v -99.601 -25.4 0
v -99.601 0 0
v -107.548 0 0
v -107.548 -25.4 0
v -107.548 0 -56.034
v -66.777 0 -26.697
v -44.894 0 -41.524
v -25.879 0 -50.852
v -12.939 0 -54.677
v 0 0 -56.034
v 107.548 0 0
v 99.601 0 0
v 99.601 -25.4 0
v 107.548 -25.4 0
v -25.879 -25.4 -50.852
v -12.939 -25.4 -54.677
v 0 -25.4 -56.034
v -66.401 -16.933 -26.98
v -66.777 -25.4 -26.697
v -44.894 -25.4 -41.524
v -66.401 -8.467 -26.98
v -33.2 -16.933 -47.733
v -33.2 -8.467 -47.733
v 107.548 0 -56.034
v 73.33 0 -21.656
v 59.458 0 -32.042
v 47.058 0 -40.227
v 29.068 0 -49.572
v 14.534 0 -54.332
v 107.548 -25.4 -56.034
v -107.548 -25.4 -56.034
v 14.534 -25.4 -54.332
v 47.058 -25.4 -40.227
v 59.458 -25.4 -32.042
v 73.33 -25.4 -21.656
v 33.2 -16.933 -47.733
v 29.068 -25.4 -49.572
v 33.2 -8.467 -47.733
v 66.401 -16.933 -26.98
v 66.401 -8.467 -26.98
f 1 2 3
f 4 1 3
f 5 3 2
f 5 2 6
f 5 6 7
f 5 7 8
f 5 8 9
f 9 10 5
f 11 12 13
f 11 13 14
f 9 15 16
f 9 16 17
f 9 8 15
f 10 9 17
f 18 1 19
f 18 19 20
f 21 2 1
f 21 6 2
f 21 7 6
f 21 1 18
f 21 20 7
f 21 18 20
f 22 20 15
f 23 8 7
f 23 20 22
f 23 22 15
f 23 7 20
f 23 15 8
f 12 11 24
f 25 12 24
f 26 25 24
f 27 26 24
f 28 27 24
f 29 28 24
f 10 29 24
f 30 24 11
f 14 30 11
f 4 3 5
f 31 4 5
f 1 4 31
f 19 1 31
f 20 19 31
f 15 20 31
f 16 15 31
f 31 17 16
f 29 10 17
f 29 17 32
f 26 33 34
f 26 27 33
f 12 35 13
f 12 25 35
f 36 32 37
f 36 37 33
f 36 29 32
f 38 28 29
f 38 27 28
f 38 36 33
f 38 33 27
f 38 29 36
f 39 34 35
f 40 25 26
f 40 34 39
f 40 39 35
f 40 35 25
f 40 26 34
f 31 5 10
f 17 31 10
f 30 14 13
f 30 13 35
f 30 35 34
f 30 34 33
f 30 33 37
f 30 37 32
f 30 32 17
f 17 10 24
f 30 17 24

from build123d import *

# Parameters (mm, degrees)
F1_DEPTH = 25.4
F0_W     = 7.9461932182
F0_H     = 56.0344010592


with BuildPart() as f1:
    # F0 (on Front) → F1 (new body)
    with BuildSketch(Plane.XZ):
        Polygon((-99.6014922857, -2.6030649897), (-99.6014922857, 0), (-107.547685504, 0), (-107.547685504, -56.0344010592), (-99.6014922857, -56.0344010592), align=None)
        with BuildLine():
            add(Edge.make_bspline(
                [(-99.6014922857, 0), (-66.4009948572, -28.0172005296), (-33.2004974052, -56.0344010789), (4.68e-08, -56.0344010592)],
                knots=[0, 0, 0, 0, 0.5, 0.5, 0.5, 0.5], degree=3))
            Line((-99.6014922857, 0), (-99.6014922857, -2.6030649897))
            Line((-99.6014922857, -2.6030649897), (-99.6014922857, -56.0344010592))
            Line((-99.6014922857, -56.0344010592), (7.02e-08, -56.0344010592))
        make_face()
    extrude(amount=F1_DEPTH)


with BuildPart() as f1b:
    # F0 (on Front) → F1, piece 2 (new body)
    with BuildSketch(Plane.XZ):
        with BuildLine():
            add(Edge.make_bspline(
                [(4.68e-08, -56.0344010592), (33.200497452, -56.0344010394), (66.4009948572, -28.0172005296), (99.6014922857, 0)],
                knots=[0.5, 0.5, 0.5, 0.5, 1, 1, 1, 1], degree=3))
            Line((7.02e-08, -56.0344010592), (99.6014922857, -56.0344010592))
            Line((99.6014922857, -56.0344010592), (99.6014922857, 0))
        make_face()
        with Locations((103.5745888948, -28.0172005296)):
            Rectangle(F0_W, F0_H)
    extrude(amount=F1_DEPTH)


solid = Compound([f1.part, f1b.part])
